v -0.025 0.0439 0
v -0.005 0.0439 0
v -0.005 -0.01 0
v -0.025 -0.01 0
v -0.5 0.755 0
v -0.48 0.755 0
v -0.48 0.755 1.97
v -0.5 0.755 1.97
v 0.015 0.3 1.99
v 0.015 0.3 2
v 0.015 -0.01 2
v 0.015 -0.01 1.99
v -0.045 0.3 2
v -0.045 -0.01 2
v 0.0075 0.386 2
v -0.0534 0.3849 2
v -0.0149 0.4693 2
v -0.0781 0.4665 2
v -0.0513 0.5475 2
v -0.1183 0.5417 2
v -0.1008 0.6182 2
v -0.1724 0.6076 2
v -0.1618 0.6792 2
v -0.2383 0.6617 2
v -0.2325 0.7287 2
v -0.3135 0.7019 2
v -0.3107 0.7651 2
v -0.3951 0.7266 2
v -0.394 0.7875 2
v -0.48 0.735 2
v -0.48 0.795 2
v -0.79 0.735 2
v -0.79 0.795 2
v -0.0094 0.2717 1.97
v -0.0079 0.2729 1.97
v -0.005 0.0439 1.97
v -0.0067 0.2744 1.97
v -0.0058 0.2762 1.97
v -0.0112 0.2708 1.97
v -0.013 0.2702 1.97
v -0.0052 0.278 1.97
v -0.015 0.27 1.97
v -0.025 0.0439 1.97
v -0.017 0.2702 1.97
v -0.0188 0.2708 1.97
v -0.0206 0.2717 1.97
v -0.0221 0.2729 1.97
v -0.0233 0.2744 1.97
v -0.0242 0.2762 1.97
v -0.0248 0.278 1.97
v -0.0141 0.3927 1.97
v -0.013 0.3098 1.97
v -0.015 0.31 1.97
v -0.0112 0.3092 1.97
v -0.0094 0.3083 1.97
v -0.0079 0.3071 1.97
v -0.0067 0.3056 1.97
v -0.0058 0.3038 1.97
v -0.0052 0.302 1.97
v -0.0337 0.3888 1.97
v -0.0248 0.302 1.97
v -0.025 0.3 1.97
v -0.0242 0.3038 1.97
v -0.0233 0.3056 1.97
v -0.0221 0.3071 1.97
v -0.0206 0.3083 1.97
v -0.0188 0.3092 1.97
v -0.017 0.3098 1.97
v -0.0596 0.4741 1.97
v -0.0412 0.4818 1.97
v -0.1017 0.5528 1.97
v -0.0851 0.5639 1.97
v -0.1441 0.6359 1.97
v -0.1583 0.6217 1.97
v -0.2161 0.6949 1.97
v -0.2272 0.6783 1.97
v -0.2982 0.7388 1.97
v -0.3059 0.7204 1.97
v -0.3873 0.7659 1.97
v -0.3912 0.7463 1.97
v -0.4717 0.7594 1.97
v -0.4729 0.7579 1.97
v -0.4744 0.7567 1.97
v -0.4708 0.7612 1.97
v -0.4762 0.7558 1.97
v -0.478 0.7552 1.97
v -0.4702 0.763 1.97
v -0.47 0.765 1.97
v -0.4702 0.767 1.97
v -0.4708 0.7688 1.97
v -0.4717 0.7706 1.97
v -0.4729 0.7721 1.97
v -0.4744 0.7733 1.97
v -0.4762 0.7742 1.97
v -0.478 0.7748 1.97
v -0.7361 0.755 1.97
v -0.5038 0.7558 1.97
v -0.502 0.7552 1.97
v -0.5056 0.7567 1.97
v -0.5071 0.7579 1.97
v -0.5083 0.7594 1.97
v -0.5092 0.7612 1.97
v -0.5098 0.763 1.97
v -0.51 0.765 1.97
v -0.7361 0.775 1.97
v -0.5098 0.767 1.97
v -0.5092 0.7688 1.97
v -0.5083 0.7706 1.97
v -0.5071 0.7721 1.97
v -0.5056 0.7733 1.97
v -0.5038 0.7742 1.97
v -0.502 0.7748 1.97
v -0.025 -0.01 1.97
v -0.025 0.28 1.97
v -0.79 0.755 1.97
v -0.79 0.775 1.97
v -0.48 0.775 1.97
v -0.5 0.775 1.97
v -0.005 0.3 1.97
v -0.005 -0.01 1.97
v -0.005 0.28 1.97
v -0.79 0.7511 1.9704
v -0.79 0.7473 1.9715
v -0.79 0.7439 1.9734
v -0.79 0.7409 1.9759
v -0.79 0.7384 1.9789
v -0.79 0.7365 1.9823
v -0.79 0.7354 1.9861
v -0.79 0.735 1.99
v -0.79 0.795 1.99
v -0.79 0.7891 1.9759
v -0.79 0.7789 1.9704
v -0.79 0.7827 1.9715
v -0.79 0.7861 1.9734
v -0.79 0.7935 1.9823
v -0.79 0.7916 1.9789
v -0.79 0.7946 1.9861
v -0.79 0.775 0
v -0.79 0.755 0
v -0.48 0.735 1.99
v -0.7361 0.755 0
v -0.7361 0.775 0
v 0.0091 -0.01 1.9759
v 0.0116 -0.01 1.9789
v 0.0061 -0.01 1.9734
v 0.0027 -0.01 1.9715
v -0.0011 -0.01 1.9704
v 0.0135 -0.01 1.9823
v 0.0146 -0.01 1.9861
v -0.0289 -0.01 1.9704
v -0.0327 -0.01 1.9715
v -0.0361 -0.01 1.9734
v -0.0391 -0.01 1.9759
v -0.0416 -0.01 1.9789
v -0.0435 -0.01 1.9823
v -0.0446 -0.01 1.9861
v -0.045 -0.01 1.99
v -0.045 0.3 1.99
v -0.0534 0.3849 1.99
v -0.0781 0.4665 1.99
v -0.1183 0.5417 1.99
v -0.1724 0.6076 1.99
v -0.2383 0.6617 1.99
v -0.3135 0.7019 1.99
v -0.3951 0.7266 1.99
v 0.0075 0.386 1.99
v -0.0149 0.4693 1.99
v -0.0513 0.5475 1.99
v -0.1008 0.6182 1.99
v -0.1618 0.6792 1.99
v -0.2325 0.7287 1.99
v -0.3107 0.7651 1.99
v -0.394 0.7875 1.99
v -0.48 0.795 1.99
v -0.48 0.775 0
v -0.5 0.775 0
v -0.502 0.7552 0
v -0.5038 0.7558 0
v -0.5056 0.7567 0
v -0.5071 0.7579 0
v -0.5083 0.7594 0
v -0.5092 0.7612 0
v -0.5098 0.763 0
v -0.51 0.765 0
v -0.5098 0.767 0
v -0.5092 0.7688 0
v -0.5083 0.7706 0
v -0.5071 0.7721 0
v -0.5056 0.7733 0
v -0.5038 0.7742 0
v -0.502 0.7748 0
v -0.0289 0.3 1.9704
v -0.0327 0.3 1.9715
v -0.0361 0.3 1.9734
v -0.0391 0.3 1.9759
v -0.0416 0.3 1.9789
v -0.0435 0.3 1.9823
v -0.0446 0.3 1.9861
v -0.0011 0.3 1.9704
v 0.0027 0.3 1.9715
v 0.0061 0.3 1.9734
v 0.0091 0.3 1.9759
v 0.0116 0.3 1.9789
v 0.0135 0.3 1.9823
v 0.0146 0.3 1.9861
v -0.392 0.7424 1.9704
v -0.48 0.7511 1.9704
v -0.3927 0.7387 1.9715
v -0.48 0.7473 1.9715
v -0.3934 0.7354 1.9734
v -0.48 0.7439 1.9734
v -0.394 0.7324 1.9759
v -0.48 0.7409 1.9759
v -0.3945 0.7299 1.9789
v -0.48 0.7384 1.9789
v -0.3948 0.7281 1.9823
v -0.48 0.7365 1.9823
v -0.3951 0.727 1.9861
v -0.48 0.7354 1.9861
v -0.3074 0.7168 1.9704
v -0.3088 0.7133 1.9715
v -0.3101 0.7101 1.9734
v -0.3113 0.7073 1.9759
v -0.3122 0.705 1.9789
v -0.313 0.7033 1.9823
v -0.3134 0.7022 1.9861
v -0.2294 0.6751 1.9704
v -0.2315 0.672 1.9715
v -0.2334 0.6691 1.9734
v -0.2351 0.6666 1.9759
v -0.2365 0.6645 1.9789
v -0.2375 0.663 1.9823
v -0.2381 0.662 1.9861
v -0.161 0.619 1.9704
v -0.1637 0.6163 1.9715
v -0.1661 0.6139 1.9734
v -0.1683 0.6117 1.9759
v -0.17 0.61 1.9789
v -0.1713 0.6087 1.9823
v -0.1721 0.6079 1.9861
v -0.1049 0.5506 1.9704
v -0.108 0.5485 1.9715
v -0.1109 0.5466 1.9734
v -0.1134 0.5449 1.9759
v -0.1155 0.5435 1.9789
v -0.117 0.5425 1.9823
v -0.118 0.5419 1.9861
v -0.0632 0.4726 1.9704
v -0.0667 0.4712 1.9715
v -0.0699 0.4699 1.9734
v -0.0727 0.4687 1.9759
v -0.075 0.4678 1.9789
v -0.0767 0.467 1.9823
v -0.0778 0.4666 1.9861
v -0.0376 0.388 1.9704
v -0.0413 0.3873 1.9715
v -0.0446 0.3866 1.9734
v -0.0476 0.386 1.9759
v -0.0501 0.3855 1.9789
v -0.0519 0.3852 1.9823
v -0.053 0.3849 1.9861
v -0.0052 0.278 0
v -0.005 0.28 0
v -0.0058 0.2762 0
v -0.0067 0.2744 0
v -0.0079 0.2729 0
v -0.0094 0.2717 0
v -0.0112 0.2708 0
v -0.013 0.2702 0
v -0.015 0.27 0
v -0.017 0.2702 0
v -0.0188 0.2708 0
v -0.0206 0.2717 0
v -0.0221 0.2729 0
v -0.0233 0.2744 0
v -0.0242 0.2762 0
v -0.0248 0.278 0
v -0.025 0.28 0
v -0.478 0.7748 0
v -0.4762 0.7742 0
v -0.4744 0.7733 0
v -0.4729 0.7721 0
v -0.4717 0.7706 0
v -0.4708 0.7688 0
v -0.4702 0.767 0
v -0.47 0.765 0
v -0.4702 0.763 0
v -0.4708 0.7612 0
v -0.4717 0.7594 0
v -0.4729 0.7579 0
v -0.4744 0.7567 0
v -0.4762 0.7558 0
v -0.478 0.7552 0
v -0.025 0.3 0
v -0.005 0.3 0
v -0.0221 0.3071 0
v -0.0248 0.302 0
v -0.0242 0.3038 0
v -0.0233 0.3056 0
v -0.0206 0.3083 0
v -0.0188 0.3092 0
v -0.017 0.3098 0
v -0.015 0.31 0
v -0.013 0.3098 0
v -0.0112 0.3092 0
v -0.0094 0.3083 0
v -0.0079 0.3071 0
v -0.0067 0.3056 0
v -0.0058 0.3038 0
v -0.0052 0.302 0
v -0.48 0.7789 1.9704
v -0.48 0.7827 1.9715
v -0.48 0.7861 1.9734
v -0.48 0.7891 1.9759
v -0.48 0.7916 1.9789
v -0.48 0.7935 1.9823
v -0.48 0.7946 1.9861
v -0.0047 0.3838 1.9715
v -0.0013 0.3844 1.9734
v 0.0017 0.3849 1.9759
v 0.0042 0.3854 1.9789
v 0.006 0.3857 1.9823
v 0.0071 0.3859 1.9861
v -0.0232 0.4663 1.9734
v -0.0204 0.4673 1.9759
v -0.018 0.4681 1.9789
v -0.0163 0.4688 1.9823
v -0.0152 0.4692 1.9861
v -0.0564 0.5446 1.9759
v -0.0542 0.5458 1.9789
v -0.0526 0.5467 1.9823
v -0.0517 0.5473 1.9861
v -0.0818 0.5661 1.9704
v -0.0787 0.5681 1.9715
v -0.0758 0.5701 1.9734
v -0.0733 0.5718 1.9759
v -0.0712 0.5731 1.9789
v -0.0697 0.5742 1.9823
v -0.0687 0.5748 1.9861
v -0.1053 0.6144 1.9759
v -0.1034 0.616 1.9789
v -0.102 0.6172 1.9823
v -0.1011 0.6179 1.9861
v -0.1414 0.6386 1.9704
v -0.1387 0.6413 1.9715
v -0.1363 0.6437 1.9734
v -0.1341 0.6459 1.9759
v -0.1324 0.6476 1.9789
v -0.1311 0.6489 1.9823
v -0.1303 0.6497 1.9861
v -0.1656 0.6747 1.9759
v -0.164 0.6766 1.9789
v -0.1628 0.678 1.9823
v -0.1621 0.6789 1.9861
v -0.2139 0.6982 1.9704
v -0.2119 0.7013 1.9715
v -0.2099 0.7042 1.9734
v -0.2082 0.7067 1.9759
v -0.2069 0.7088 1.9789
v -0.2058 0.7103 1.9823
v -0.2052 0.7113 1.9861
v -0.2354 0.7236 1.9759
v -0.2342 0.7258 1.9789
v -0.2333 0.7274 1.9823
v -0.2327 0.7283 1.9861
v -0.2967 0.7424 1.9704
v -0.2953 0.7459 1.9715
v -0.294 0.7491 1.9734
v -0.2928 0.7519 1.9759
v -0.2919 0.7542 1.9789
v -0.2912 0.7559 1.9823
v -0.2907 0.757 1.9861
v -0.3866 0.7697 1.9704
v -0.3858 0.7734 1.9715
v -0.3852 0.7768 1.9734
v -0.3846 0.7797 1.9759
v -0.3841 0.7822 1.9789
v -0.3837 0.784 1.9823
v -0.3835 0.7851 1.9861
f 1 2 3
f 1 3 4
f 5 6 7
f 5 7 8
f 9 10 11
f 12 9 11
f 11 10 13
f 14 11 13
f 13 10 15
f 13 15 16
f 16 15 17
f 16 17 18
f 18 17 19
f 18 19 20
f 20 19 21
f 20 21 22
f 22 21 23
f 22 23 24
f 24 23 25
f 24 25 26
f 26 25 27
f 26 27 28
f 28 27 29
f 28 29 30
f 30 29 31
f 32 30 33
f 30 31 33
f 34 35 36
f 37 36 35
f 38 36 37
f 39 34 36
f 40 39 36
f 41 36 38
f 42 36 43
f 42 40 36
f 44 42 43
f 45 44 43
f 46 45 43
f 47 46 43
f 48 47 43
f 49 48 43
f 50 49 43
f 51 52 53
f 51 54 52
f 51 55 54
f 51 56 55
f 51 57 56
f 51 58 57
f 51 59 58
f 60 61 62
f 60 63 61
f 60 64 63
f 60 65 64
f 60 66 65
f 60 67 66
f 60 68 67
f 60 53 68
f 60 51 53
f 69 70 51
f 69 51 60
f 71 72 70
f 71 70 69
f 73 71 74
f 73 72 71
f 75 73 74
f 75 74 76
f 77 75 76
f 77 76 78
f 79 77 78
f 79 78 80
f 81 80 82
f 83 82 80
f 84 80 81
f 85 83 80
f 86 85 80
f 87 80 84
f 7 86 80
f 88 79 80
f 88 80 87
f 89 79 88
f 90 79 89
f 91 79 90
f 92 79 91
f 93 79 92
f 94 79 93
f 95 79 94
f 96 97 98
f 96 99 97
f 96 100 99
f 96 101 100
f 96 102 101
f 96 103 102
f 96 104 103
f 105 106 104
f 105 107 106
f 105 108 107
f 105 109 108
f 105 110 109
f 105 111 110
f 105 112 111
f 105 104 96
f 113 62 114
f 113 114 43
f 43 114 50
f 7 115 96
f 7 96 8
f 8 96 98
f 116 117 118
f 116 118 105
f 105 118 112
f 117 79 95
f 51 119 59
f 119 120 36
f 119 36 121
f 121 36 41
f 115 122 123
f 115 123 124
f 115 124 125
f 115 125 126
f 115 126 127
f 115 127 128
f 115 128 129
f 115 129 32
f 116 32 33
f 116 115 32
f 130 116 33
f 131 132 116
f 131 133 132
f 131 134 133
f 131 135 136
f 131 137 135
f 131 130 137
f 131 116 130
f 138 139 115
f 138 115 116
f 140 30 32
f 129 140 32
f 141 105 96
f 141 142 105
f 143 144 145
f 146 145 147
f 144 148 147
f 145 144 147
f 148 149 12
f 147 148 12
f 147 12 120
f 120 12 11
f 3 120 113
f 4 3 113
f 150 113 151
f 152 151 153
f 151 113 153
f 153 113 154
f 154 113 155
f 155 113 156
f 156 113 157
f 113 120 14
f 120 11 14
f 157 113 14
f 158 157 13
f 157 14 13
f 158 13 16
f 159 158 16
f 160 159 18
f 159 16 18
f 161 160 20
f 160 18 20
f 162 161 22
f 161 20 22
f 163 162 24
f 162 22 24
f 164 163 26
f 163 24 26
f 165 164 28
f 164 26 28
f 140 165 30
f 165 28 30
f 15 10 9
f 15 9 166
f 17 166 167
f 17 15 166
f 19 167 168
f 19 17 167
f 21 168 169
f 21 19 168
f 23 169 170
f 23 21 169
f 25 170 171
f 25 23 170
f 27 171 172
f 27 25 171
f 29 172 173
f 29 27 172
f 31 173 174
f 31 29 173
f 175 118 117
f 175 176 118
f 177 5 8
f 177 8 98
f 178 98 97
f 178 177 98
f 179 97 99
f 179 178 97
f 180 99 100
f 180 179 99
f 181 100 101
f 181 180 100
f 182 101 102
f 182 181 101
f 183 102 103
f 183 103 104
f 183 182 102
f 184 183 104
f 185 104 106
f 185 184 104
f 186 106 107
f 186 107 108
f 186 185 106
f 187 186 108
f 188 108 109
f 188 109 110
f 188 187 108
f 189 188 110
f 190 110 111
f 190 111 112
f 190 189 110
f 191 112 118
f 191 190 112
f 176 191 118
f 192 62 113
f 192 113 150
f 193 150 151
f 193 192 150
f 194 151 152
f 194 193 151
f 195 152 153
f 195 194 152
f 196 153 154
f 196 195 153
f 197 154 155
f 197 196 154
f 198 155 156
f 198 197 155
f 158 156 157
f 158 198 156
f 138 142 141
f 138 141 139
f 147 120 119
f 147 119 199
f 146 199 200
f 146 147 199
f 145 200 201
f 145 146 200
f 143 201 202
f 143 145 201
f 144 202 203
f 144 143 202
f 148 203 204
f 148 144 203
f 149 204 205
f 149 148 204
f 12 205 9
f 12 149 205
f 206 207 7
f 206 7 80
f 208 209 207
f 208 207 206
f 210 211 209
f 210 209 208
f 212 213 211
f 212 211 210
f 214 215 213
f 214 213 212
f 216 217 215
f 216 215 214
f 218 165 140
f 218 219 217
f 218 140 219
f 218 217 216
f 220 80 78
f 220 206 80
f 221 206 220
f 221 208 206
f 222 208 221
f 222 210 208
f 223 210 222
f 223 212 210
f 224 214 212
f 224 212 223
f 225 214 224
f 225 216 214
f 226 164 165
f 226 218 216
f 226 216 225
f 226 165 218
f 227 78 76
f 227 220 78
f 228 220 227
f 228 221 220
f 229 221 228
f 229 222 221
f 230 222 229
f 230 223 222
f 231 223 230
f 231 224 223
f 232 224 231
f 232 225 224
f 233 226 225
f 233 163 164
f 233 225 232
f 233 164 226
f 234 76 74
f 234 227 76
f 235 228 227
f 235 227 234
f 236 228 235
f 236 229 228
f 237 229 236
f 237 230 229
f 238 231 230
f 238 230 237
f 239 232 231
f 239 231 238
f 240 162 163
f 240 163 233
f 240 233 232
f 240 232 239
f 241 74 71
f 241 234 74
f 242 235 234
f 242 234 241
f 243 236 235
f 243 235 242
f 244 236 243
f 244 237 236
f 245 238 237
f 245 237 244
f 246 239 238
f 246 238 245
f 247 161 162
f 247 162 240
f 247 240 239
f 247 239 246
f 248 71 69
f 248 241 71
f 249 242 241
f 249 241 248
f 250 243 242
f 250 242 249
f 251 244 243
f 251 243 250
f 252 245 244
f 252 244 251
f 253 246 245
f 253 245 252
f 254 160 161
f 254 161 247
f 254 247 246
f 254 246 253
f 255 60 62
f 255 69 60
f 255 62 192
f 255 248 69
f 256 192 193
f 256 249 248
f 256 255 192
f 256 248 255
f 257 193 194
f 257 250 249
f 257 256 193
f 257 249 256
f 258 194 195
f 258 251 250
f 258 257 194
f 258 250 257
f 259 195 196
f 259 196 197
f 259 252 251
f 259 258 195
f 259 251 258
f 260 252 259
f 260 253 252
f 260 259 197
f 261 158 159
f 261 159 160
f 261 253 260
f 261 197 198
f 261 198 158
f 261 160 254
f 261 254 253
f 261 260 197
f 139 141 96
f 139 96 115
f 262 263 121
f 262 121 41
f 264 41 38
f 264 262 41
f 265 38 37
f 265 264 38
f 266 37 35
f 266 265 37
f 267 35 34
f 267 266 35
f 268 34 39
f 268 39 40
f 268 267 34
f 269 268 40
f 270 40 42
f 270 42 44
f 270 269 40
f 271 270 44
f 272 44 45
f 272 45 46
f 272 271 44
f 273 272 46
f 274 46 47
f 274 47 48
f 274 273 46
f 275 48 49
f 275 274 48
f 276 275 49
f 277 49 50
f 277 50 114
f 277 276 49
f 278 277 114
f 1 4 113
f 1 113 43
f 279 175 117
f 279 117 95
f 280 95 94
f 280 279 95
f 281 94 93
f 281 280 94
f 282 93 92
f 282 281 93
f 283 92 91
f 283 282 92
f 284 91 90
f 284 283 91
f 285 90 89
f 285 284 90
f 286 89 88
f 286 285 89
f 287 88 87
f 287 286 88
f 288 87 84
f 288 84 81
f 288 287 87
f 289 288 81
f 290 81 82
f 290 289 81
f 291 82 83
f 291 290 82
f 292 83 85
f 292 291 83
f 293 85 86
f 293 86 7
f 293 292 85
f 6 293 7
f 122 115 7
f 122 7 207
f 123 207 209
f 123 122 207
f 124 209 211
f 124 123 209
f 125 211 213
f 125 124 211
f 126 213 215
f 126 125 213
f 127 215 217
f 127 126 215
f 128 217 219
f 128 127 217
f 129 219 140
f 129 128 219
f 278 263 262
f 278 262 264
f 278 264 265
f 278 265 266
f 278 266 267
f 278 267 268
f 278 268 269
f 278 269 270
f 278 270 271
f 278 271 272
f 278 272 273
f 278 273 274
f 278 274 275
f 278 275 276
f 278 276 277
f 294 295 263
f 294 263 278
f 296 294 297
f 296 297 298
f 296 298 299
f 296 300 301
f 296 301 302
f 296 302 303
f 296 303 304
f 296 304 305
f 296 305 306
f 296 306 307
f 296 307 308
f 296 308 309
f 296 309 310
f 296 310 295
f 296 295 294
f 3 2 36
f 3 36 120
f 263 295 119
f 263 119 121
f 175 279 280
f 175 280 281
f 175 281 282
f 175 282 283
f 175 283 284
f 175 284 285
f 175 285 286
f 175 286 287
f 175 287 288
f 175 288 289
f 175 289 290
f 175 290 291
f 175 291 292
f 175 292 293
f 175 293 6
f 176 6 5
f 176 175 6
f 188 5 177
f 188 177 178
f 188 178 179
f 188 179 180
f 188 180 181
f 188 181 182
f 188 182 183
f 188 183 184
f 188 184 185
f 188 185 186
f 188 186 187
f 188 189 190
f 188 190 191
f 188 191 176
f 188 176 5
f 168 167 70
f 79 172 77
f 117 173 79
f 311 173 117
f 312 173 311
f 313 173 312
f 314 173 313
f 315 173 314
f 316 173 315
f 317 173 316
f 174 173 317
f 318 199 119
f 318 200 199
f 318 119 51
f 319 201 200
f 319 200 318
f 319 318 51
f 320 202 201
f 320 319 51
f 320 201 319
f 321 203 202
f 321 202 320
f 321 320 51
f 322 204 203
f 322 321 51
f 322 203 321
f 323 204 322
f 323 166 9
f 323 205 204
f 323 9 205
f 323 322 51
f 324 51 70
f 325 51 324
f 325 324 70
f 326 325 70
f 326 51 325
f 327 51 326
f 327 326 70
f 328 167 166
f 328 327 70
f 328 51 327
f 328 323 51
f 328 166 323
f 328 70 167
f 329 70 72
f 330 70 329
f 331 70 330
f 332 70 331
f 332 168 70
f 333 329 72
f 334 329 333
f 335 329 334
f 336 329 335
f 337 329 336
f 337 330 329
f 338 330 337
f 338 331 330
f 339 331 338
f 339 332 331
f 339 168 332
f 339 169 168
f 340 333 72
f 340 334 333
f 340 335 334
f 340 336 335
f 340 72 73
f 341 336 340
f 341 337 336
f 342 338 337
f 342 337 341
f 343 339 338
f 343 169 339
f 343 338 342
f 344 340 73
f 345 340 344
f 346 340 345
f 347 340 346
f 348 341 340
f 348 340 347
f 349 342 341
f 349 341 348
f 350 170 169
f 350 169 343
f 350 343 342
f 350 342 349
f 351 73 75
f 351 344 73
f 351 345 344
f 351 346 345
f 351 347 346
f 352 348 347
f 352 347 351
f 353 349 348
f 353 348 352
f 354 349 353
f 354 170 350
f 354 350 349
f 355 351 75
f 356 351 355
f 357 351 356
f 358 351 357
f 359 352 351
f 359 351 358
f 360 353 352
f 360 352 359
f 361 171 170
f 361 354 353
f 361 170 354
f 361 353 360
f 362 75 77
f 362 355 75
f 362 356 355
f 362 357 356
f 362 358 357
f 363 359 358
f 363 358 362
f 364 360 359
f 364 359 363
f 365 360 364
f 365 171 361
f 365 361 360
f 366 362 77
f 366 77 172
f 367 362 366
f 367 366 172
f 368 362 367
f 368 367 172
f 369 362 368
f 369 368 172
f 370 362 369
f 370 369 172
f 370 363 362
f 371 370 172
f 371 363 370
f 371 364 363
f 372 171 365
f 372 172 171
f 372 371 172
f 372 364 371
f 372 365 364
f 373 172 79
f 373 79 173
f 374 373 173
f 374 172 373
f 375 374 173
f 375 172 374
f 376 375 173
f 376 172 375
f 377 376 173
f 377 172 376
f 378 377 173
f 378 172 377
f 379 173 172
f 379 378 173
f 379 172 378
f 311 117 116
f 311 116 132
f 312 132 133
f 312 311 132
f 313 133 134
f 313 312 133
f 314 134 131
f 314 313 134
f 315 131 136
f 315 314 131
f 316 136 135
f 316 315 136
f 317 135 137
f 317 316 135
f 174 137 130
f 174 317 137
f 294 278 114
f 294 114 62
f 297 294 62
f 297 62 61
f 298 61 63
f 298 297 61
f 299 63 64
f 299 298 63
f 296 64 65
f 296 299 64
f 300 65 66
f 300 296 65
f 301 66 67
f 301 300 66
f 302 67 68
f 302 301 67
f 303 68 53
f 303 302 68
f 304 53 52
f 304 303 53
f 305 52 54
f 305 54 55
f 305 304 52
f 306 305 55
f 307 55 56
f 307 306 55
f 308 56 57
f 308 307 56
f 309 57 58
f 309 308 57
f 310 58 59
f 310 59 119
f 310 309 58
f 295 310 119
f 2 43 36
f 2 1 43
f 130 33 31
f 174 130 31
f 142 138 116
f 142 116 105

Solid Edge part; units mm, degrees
sketch "Sketch1" plane through (0, 0, 0) normal (0, 0, 1) x (1, 0, 0)
  line L0 (-0.5, 0.775) -> (-0.48, 0.775)
  line L1 (-0.5, 0.755) -> (-0.48, 0.755)
  arc A0 (-0.5, 0.755) -> (-0.5, 0.775) centre (-0.5, 0.765) cw
  arc A1 (-0.48, 0.775) -> (-0.48, 0.755) centre (-0.48, 0.765) cw
  line L2 (-0.005, -0.01) -> (-0.025, -0.01)
  line L3 (-0.025, -0.01) -> (-0.025, 0.0439)
  line L4 (-0.025, 0.0439) -> (-0.005, 0.0439)
  line L5 (-0.005, 0.0439) -> (-0.005, -0.01)
  line L6 (-0.005, 0.3) -> (-0.005, 0.28)
  line L7 (-0.025, 0.28) -> (-0.025, 0.3)
  arc A2 (-0.025, 0.3) -> (-0.005, 0.3) centre (-0.015, 0.3) cw
  arc A3 (-0.005, 0.28) -> (-0.025, 0.28) centre (-0.015, 0.28) cw
  line L8 (-0.79, 0.755) -> (-0.79, 0.775)
  line L9 (-0.79, 0.775) -> (-0.7361, 0.775)
  line L10 (-0.7361, 0.775) -> (-0.7361, 0.755)
  line L11 (-0.7361, 0.755) -> (-0.79, 0.755)
  dimension "D1" = 0.79
  dimension "D2" = 0.7361
  dimension "D3" = 0.015
extrude "Protrusion1" add sketch "Sketch1" along normal blind 2
sketch "Sketch2" plane through (-0.015, 0.0169, 2) normal (0, 0, 1) x (0, 1, 0)
  line L0 (-0.0269, 0.01) -> (0.2831, 0.01)
  line L1 (-0.0269, -0.01) -> (-0.0269, 0.01)
  line L2 (0.2831, -0.01) -> (-0.0269, -0.01)
  line L3 (0.7581, 0.775) -> (0.7581, 0.465)
  line L4 (0.7381, 0.775) -> (0.7581, 0.775)
  line L5 (0.7381, 0.465) -> (0.7381, 0.775)
  arc A0 (0.7381, 0.465) -> (0.2831, 0.01) centre (0.2831, 0.465) cw
  arc A1 (0.2831, -0.01) -> (0.7581, 0.465) centre (0.2831, 0.465) ccw
extrude "Ausprägung_4" add sketch "Sketch2" against normal blind 0.03
sketch "Sketch3" plane through (-0.3975, 0.3825, 2) normal (0, 0, 1) x (0, 1, 0)
  line L0 (0.4125, 0.3925) -> (0.4125, 0.0825)
  arc A0 (-0.0825, -0.4125) -> (0.4125, 0.0825) centre (-0.0825, 0.0825) ccw
  line L1 (-0.0825, -0.4125) -> (-0.3925, -0.4125)
  line L2 (-0.3925, -0.4125) -> (-0.3925, -0.3525)
  line L3 (-0.3925, -0.3525) -> (-0.0825, -0.3525)
  arc A1 (0.3525, 0.0825) -> (-0.0825, -0.3525) centre (-0.0825, 0.0825) cw
  line L4 (0.3525, 0.0825) -> (0.3525, 0.3925)
  line L5 (0.3525, 0.3925) -> (0.4125, 0.3925)
extrude "Protrusion2" add sketch "Sketch3" against normal up to surface (0.03 mm away)
fillet "Verrundung_1" radius 0.02 6 edges at (0.015, 0.145, 1.97) (-0.13, 0.65, 1.97) (-0.635, 0.795, 1.97) (-0.045, 0.145, 1.97) (-0.1724, 0.6076, 1.97) (-0.635, 0.735, 1.97)
